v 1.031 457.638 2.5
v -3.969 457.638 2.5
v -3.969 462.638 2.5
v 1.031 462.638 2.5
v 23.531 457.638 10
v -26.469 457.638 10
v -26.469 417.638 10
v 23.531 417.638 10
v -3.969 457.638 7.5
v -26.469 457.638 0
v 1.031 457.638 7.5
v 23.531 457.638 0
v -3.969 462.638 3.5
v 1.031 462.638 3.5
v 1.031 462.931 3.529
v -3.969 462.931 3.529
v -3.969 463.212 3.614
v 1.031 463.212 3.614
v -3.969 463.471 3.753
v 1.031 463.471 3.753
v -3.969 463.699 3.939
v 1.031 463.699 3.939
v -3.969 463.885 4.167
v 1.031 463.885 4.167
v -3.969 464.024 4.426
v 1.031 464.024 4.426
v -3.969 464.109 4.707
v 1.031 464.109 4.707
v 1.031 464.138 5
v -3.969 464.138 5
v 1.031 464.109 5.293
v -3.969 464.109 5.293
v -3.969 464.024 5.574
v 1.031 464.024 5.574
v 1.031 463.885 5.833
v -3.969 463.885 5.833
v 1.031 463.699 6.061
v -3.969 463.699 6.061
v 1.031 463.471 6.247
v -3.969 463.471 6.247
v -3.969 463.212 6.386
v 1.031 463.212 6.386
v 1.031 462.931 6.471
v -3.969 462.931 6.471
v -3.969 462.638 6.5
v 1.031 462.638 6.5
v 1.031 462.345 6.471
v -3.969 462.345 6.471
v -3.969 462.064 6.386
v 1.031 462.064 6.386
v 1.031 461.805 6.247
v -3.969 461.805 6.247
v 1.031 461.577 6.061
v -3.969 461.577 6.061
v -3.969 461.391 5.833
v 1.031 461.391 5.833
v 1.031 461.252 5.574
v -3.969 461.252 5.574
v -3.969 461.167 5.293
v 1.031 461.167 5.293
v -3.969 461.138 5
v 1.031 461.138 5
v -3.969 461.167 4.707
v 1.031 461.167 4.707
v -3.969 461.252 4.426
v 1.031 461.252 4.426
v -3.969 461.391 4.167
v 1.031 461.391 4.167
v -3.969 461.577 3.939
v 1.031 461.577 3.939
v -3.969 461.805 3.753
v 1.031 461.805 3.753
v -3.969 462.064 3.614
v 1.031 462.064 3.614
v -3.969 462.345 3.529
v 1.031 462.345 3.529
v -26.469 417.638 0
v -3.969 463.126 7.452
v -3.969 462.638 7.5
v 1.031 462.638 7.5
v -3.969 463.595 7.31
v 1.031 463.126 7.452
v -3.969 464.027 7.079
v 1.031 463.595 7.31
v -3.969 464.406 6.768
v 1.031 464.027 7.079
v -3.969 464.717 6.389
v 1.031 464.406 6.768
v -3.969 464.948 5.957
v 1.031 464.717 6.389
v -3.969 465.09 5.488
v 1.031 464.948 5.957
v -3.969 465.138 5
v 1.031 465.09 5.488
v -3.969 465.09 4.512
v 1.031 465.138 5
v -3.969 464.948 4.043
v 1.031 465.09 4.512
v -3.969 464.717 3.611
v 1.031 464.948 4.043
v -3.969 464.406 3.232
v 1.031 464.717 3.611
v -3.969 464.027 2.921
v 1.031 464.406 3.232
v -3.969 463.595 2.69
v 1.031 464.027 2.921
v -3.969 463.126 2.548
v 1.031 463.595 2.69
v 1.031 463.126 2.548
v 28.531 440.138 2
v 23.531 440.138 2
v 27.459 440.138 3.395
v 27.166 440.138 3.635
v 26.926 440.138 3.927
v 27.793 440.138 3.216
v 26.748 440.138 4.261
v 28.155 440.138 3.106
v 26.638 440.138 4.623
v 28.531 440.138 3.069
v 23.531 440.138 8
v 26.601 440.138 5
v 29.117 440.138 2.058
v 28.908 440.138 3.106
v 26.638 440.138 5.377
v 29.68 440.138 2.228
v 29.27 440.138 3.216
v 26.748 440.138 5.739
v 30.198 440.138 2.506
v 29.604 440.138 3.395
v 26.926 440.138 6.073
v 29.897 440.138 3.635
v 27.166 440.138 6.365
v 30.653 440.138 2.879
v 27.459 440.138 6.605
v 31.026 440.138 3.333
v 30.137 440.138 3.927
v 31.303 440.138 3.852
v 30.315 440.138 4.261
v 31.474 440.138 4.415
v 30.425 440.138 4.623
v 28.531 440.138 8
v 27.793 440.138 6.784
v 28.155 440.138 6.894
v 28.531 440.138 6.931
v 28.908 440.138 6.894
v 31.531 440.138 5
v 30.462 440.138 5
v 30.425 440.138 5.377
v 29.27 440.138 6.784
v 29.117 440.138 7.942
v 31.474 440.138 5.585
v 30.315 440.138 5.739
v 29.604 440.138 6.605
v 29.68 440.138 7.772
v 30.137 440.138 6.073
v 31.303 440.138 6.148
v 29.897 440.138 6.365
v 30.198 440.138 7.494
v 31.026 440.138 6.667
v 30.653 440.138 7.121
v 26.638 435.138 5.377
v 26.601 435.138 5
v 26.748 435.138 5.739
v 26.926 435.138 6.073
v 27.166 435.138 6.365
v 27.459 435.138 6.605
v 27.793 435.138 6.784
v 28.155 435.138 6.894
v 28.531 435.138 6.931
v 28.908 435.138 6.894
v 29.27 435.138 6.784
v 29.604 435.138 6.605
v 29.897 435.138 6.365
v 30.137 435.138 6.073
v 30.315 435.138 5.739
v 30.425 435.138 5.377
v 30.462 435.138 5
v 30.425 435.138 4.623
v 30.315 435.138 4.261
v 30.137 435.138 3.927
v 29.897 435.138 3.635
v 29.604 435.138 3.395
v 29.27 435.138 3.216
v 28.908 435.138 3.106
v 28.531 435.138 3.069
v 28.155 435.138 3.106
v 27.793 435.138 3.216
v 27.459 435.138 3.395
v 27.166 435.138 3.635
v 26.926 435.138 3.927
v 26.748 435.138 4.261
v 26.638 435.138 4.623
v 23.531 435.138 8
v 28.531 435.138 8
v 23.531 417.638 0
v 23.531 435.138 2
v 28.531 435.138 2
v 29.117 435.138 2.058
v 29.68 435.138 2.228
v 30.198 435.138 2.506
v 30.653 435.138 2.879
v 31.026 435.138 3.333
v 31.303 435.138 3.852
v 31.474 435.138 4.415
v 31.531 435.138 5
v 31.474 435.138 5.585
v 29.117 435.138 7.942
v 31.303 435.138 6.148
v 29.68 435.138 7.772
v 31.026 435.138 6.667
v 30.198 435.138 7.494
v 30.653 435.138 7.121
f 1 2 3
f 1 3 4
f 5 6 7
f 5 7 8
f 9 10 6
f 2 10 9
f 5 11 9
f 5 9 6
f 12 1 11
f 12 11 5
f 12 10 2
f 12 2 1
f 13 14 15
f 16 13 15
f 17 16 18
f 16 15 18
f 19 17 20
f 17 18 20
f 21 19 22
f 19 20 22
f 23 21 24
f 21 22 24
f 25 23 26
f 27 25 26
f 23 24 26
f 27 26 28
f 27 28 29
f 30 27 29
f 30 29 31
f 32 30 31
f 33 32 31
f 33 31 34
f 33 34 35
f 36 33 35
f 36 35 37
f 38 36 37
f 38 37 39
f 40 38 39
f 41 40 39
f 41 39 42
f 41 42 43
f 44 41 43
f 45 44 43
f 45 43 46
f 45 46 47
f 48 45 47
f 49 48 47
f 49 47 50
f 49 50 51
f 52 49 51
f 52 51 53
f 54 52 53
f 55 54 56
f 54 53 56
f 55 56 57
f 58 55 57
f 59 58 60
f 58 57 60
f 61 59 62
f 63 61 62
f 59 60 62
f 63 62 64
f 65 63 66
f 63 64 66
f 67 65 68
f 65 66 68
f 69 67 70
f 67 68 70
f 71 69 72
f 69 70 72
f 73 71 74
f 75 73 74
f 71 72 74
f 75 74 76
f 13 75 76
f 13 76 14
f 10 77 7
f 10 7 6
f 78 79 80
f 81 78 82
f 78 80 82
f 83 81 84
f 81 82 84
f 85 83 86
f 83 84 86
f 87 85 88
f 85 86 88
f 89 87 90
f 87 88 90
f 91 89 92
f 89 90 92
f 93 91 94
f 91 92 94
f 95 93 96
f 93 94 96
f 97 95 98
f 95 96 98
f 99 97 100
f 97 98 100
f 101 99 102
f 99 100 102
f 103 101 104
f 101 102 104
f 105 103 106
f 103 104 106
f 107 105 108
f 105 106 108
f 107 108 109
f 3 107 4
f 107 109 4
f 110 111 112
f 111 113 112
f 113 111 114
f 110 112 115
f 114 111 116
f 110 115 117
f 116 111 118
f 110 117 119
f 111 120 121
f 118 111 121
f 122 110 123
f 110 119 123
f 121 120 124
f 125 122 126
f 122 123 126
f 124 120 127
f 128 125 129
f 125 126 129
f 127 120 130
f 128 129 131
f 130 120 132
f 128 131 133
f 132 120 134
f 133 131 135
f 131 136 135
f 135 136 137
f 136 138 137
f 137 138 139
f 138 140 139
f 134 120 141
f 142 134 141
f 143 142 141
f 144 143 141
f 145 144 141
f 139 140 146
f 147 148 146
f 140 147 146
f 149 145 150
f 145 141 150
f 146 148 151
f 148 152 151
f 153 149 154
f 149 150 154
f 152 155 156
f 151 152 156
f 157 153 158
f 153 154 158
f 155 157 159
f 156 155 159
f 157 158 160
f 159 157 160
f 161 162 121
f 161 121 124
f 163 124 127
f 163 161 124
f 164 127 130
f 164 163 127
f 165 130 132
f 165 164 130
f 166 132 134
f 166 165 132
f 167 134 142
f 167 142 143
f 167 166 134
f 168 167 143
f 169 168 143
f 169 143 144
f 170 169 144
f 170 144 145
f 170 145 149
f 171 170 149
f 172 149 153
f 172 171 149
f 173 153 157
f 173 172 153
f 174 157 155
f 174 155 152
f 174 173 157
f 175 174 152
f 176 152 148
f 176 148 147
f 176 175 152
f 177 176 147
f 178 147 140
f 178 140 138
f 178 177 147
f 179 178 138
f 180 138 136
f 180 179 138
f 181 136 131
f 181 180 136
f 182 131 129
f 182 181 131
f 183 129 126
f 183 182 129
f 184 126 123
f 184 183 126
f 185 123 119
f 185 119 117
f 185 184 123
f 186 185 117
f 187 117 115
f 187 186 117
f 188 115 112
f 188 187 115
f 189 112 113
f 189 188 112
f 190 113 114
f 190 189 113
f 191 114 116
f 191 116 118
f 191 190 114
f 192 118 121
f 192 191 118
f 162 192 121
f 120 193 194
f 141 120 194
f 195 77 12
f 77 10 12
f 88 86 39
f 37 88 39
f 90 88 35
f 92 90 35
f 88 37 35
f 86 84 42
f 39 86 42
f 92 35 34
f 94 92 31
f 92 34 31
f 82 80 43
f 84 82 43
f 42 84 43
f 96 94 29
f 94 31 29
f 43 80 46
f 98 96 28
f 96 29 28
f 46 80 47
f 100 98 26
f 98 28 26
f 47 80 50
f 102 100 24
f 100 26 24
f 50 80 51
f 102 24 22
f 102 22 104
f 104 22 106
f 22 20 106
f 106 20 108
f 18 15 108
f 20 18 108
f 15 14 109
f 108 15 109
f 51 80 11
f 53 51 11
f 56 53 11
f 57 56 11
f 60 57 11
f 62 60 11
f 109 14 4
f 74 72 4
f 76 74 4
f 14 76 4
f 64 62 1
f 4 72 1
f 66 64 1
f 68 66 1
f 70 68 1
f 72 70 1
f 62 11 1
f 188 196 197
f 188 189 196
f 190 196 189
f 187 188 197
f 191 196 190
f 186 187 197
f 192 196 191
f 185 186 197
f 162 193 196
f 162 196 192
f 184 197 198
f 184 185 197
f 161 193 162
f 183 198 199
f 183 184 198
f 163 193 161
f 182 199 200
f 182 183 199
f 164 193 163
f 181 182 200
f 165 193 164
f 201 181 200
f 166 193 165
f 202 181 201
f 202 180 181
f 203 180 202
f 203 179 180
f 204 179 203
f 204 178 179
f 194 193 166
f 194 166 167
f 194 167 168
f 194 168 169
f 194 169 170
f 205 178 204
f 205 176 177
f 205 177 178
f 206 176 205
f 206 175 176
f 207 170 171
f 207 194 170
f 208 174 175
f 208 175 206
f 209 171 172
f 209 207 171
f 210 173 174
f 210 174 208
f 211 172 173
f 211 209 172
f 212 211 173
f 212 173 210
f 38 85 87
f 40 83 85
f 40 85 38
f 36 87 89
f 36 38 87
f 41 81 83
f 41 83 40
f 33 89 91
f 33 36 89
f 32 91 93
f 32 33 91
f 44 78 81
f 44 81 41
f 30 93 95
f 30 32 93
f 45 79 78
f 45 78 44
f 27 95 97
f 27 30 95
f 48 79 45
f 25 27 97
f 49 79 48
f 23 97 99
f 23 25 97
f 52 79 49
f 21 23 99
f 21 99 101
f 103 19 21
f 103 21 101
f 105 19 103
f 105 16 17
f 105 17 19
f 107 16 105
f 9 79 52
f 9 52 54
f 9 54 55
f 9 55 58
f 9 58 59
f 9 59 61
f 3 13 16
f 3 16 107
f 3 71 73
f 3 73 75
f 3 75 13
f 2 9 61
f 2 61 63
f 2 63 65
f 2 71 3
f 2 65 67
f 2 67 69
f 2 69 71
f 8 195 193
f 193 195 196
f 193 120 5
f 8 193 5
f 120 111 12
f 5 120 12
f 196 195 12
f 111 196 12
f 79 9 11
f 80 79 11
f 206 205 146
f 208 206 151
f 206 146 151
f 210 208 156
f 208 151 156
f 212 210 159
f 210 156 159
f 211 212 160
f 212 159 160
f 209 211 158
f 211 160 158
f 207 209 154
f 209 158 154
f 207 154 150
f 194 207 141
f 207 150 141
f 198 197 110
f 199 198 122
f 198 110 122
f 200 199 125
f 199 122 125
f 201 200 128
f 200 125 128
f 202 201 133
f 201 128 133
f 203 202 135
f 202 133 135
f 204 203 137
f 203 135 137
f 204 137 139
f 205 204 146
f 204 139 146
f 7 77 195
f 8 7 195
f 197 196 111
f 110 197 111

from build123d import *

# Parameters (mm, degrees)
SKETCH1_W           = 50
SKETCH1_H           = 40
BOSS_EXTRUDE1_DEPTH = 10
SKETCH5_W           = 6
SKETCH5_H           = 5
BOSS_EXTRUDE3_DEPTH = 10
SKETCH6_R           = 2
CUT_EXTRUDE1_DEPTH  = 20
SKETCH8_W           = 10
SKETCH8_H           = 40
CUT_EXTRUDE2_DEPTH  = 25
SKETCH9_W           = 10
SKETCH9_H           = 6
SKETCH9_R           = 1.930897171
BOSS_EXTRUDE4_DEPTH = 5
SKETCH10_W          = 10
SKETCH10_H          = 5
CUT_EXTRUDE3_DEPTH  = 15
SKETCH11_W          = 5
SKETCH11_H          = 5
BOSS_EXTRUDE5_DEPTH = 10
SKETCH12_R          = 1.5
CUT_EXTRUDE4_DEPTH  = 10
CUT_EXTRUDE5_DEPTH  = 10
CUT_EXTRUDE6_DEPTH  = 10


with BuildPart() as part:
    # Sketch1 → Boss-Extrude1 (new body)
    with BuildSketch(Plane(origin=(669.84184187, 0, 0), x_dir=(1, 0, 0), z_dir=(0, 0, 1))):
        with Locations((-671.310344828, 437.637931034)):
            Rectangle(SKETCH1_W, SKETCH1_H)
    boss_extrude1 = extrude(amount=BOSS_EXTRUDE1_DEPTH)

    # Sketch5 → Boss-Extrude3 (add)
    with BuildSketch(Plane(origin=(23.531497042, 0, 0), x_dir=(0, 0, -1), z_dir=(1, 0, 0))):
        with Locations((-5, 442.637931034)):
            Rectangle(SKETCH5_W, SKETCH5_H)
        with Locations((-5, 432.637931034)):
            Rectangle(SKETCH5_W, SKETCH5_H)
    extrude(amount=BOSS_EXTRUDE3_DEPTH)

    # Sketch6 → Cut-Extrude1 (cut)
    with BuildSketch(Plane(origin=(669.84184187, 445.137931034, 0), x_dir=(1, 0, 0), z_dir=(0, 1, 0))):
        with Locations(Location((-641.310344828, -5, 0), (0, 0, 180))):
            Circle(SKETCH6_R)
    extrude(amount=-CUT_EXTRUDE1_DEPTH, mode=Mode.SUBTRACT)

    # Sketch8 → Cut-Extrude2 (cut)
    with BuildSketch(Plane.ZY.offset(26.468502958)):
        with Locations((5, 437.637931034)):
            Rectangle(SKETCH8_W, SKETCH8_H)
    extrude(amount=-CUT_EXTRUDE2_DEPTH, mode=Mode.SUBTRACT)

    # Sketch9 → Boss-Extrude4 (add)
    with BuildSketch(Plane(origin=(0, 435.137931034, 0), x_dir=(1, 0, 0), z_dir=(0, 1, 0))):
        with Locations((28.531497042, -5)):
            Rectangle(SKETCH9_W, SKETCH9_H)
        with Locations(Location((28.531497042, -5, 0), (0, 0, 180))):
            Circle(SKETCH9_R, mode=Mode.SUBTRACT)
    extrude(amount=BOSS_EXTRUDE4_DEPTH)

    # Sketch10 → Cut-Extrude3 (cut)
    with BuildSketch(Plane.XY.offset(8)):
        with Locations((28.531497042, 432.637931034)):
            Rectangle(SKETCH10_W, SKETCH10_H)
        with Locations((28.531497042, 442.637931034)):
            Rectangle(SKETCH10_W, SKETCH10_H)
    extrude(amount=-CUT_EXTRUDE3_DEPTH, mode=Mode.SUBTRACT)

    # Mirror1: Boss-Extrude1 across plane
    add(boss_extrude1.mirror(Plane(origin=(-1.468502958, 0, 0), x_dir=(0, 0, 1), z_dir=(1, 0, 0))))

    # Sketch11 → Boss-Extrude5 (add)
    with BuildSketch(Plane(origin=(0, 457.637931034, 0), x_dir=(1, 0, 0), z_dir=(0, 1, 0))):
        with Locations((-1.468502958, -5)):
            Rectangle(SKETCH11_W, SKETCH11_H)
    extrude(amount=BOSS_EXTRUDE5_DEPTH)

    # Sketch12 → Cut-Extrude4 (cut)
    with BuildSketch(Plane(origin=(1.031497042, 0, 0), x_dir=(0, 0, -1), z_dir=(1, 0, 0))):
        with Locations((-5, 462.637931034)):
            Circle(SKETCH12_R)
    extrude(amount=-CUT_EXTRUDE4_DEPTH, mode=Mode.SUBTRACT)

    # Sketch13 → Cut-Extrude5 (cut)
    with BuildSketch(Plane(origin=(1.031497042, 0, 0), x_dir=(0, 0, -1), z_dir=(1, 0, 0))):
        with BuildLine():
            Line((-7.5, 467.637931034), (-7.5, 462.637931034))
            ThreePointArc((-7.5, 462.637931034), (-5, 465.137931034), (-2.5, 462.637931034))
            Line((-2.5, 462.637931034), (-2.5, 467.637931034))
            Line((-2.5, 467.637931034), (-7.5, 467.637931034))
        make_face()
    extrude(amount=-CUT_EXTRUDE5_DEPTH, mode=Mode.SUBTRACT)

    # Sketch14 → Cut-Extrude6 (cut)
    with BuildSketch(Plane(origin=(0, 440.137931034, 0), x_dir=(1, 0, 0), z_dir=(0, 1, 0))):
        with BuildLine():
            Line((33.531497042, -2), (28.531497042, -2))
            ThreePointArc((28.531497042, -2), (30.652817386, -2.878679656), (31.531497042, -5))
            ThreePointArc((31.531497042, -5), (30.652817386, -7.121320344), (28.531497042, -8))
            Line((28.531497042, -8), (33.531497042, -8))
            Line((33.531497042, -8), (33.531497042, -2))
        make_face()
    extrude(amount=-CUT_EXTRUDE6_DEPTH, mode=Mode.SUBTRACT)


solid = part.part
